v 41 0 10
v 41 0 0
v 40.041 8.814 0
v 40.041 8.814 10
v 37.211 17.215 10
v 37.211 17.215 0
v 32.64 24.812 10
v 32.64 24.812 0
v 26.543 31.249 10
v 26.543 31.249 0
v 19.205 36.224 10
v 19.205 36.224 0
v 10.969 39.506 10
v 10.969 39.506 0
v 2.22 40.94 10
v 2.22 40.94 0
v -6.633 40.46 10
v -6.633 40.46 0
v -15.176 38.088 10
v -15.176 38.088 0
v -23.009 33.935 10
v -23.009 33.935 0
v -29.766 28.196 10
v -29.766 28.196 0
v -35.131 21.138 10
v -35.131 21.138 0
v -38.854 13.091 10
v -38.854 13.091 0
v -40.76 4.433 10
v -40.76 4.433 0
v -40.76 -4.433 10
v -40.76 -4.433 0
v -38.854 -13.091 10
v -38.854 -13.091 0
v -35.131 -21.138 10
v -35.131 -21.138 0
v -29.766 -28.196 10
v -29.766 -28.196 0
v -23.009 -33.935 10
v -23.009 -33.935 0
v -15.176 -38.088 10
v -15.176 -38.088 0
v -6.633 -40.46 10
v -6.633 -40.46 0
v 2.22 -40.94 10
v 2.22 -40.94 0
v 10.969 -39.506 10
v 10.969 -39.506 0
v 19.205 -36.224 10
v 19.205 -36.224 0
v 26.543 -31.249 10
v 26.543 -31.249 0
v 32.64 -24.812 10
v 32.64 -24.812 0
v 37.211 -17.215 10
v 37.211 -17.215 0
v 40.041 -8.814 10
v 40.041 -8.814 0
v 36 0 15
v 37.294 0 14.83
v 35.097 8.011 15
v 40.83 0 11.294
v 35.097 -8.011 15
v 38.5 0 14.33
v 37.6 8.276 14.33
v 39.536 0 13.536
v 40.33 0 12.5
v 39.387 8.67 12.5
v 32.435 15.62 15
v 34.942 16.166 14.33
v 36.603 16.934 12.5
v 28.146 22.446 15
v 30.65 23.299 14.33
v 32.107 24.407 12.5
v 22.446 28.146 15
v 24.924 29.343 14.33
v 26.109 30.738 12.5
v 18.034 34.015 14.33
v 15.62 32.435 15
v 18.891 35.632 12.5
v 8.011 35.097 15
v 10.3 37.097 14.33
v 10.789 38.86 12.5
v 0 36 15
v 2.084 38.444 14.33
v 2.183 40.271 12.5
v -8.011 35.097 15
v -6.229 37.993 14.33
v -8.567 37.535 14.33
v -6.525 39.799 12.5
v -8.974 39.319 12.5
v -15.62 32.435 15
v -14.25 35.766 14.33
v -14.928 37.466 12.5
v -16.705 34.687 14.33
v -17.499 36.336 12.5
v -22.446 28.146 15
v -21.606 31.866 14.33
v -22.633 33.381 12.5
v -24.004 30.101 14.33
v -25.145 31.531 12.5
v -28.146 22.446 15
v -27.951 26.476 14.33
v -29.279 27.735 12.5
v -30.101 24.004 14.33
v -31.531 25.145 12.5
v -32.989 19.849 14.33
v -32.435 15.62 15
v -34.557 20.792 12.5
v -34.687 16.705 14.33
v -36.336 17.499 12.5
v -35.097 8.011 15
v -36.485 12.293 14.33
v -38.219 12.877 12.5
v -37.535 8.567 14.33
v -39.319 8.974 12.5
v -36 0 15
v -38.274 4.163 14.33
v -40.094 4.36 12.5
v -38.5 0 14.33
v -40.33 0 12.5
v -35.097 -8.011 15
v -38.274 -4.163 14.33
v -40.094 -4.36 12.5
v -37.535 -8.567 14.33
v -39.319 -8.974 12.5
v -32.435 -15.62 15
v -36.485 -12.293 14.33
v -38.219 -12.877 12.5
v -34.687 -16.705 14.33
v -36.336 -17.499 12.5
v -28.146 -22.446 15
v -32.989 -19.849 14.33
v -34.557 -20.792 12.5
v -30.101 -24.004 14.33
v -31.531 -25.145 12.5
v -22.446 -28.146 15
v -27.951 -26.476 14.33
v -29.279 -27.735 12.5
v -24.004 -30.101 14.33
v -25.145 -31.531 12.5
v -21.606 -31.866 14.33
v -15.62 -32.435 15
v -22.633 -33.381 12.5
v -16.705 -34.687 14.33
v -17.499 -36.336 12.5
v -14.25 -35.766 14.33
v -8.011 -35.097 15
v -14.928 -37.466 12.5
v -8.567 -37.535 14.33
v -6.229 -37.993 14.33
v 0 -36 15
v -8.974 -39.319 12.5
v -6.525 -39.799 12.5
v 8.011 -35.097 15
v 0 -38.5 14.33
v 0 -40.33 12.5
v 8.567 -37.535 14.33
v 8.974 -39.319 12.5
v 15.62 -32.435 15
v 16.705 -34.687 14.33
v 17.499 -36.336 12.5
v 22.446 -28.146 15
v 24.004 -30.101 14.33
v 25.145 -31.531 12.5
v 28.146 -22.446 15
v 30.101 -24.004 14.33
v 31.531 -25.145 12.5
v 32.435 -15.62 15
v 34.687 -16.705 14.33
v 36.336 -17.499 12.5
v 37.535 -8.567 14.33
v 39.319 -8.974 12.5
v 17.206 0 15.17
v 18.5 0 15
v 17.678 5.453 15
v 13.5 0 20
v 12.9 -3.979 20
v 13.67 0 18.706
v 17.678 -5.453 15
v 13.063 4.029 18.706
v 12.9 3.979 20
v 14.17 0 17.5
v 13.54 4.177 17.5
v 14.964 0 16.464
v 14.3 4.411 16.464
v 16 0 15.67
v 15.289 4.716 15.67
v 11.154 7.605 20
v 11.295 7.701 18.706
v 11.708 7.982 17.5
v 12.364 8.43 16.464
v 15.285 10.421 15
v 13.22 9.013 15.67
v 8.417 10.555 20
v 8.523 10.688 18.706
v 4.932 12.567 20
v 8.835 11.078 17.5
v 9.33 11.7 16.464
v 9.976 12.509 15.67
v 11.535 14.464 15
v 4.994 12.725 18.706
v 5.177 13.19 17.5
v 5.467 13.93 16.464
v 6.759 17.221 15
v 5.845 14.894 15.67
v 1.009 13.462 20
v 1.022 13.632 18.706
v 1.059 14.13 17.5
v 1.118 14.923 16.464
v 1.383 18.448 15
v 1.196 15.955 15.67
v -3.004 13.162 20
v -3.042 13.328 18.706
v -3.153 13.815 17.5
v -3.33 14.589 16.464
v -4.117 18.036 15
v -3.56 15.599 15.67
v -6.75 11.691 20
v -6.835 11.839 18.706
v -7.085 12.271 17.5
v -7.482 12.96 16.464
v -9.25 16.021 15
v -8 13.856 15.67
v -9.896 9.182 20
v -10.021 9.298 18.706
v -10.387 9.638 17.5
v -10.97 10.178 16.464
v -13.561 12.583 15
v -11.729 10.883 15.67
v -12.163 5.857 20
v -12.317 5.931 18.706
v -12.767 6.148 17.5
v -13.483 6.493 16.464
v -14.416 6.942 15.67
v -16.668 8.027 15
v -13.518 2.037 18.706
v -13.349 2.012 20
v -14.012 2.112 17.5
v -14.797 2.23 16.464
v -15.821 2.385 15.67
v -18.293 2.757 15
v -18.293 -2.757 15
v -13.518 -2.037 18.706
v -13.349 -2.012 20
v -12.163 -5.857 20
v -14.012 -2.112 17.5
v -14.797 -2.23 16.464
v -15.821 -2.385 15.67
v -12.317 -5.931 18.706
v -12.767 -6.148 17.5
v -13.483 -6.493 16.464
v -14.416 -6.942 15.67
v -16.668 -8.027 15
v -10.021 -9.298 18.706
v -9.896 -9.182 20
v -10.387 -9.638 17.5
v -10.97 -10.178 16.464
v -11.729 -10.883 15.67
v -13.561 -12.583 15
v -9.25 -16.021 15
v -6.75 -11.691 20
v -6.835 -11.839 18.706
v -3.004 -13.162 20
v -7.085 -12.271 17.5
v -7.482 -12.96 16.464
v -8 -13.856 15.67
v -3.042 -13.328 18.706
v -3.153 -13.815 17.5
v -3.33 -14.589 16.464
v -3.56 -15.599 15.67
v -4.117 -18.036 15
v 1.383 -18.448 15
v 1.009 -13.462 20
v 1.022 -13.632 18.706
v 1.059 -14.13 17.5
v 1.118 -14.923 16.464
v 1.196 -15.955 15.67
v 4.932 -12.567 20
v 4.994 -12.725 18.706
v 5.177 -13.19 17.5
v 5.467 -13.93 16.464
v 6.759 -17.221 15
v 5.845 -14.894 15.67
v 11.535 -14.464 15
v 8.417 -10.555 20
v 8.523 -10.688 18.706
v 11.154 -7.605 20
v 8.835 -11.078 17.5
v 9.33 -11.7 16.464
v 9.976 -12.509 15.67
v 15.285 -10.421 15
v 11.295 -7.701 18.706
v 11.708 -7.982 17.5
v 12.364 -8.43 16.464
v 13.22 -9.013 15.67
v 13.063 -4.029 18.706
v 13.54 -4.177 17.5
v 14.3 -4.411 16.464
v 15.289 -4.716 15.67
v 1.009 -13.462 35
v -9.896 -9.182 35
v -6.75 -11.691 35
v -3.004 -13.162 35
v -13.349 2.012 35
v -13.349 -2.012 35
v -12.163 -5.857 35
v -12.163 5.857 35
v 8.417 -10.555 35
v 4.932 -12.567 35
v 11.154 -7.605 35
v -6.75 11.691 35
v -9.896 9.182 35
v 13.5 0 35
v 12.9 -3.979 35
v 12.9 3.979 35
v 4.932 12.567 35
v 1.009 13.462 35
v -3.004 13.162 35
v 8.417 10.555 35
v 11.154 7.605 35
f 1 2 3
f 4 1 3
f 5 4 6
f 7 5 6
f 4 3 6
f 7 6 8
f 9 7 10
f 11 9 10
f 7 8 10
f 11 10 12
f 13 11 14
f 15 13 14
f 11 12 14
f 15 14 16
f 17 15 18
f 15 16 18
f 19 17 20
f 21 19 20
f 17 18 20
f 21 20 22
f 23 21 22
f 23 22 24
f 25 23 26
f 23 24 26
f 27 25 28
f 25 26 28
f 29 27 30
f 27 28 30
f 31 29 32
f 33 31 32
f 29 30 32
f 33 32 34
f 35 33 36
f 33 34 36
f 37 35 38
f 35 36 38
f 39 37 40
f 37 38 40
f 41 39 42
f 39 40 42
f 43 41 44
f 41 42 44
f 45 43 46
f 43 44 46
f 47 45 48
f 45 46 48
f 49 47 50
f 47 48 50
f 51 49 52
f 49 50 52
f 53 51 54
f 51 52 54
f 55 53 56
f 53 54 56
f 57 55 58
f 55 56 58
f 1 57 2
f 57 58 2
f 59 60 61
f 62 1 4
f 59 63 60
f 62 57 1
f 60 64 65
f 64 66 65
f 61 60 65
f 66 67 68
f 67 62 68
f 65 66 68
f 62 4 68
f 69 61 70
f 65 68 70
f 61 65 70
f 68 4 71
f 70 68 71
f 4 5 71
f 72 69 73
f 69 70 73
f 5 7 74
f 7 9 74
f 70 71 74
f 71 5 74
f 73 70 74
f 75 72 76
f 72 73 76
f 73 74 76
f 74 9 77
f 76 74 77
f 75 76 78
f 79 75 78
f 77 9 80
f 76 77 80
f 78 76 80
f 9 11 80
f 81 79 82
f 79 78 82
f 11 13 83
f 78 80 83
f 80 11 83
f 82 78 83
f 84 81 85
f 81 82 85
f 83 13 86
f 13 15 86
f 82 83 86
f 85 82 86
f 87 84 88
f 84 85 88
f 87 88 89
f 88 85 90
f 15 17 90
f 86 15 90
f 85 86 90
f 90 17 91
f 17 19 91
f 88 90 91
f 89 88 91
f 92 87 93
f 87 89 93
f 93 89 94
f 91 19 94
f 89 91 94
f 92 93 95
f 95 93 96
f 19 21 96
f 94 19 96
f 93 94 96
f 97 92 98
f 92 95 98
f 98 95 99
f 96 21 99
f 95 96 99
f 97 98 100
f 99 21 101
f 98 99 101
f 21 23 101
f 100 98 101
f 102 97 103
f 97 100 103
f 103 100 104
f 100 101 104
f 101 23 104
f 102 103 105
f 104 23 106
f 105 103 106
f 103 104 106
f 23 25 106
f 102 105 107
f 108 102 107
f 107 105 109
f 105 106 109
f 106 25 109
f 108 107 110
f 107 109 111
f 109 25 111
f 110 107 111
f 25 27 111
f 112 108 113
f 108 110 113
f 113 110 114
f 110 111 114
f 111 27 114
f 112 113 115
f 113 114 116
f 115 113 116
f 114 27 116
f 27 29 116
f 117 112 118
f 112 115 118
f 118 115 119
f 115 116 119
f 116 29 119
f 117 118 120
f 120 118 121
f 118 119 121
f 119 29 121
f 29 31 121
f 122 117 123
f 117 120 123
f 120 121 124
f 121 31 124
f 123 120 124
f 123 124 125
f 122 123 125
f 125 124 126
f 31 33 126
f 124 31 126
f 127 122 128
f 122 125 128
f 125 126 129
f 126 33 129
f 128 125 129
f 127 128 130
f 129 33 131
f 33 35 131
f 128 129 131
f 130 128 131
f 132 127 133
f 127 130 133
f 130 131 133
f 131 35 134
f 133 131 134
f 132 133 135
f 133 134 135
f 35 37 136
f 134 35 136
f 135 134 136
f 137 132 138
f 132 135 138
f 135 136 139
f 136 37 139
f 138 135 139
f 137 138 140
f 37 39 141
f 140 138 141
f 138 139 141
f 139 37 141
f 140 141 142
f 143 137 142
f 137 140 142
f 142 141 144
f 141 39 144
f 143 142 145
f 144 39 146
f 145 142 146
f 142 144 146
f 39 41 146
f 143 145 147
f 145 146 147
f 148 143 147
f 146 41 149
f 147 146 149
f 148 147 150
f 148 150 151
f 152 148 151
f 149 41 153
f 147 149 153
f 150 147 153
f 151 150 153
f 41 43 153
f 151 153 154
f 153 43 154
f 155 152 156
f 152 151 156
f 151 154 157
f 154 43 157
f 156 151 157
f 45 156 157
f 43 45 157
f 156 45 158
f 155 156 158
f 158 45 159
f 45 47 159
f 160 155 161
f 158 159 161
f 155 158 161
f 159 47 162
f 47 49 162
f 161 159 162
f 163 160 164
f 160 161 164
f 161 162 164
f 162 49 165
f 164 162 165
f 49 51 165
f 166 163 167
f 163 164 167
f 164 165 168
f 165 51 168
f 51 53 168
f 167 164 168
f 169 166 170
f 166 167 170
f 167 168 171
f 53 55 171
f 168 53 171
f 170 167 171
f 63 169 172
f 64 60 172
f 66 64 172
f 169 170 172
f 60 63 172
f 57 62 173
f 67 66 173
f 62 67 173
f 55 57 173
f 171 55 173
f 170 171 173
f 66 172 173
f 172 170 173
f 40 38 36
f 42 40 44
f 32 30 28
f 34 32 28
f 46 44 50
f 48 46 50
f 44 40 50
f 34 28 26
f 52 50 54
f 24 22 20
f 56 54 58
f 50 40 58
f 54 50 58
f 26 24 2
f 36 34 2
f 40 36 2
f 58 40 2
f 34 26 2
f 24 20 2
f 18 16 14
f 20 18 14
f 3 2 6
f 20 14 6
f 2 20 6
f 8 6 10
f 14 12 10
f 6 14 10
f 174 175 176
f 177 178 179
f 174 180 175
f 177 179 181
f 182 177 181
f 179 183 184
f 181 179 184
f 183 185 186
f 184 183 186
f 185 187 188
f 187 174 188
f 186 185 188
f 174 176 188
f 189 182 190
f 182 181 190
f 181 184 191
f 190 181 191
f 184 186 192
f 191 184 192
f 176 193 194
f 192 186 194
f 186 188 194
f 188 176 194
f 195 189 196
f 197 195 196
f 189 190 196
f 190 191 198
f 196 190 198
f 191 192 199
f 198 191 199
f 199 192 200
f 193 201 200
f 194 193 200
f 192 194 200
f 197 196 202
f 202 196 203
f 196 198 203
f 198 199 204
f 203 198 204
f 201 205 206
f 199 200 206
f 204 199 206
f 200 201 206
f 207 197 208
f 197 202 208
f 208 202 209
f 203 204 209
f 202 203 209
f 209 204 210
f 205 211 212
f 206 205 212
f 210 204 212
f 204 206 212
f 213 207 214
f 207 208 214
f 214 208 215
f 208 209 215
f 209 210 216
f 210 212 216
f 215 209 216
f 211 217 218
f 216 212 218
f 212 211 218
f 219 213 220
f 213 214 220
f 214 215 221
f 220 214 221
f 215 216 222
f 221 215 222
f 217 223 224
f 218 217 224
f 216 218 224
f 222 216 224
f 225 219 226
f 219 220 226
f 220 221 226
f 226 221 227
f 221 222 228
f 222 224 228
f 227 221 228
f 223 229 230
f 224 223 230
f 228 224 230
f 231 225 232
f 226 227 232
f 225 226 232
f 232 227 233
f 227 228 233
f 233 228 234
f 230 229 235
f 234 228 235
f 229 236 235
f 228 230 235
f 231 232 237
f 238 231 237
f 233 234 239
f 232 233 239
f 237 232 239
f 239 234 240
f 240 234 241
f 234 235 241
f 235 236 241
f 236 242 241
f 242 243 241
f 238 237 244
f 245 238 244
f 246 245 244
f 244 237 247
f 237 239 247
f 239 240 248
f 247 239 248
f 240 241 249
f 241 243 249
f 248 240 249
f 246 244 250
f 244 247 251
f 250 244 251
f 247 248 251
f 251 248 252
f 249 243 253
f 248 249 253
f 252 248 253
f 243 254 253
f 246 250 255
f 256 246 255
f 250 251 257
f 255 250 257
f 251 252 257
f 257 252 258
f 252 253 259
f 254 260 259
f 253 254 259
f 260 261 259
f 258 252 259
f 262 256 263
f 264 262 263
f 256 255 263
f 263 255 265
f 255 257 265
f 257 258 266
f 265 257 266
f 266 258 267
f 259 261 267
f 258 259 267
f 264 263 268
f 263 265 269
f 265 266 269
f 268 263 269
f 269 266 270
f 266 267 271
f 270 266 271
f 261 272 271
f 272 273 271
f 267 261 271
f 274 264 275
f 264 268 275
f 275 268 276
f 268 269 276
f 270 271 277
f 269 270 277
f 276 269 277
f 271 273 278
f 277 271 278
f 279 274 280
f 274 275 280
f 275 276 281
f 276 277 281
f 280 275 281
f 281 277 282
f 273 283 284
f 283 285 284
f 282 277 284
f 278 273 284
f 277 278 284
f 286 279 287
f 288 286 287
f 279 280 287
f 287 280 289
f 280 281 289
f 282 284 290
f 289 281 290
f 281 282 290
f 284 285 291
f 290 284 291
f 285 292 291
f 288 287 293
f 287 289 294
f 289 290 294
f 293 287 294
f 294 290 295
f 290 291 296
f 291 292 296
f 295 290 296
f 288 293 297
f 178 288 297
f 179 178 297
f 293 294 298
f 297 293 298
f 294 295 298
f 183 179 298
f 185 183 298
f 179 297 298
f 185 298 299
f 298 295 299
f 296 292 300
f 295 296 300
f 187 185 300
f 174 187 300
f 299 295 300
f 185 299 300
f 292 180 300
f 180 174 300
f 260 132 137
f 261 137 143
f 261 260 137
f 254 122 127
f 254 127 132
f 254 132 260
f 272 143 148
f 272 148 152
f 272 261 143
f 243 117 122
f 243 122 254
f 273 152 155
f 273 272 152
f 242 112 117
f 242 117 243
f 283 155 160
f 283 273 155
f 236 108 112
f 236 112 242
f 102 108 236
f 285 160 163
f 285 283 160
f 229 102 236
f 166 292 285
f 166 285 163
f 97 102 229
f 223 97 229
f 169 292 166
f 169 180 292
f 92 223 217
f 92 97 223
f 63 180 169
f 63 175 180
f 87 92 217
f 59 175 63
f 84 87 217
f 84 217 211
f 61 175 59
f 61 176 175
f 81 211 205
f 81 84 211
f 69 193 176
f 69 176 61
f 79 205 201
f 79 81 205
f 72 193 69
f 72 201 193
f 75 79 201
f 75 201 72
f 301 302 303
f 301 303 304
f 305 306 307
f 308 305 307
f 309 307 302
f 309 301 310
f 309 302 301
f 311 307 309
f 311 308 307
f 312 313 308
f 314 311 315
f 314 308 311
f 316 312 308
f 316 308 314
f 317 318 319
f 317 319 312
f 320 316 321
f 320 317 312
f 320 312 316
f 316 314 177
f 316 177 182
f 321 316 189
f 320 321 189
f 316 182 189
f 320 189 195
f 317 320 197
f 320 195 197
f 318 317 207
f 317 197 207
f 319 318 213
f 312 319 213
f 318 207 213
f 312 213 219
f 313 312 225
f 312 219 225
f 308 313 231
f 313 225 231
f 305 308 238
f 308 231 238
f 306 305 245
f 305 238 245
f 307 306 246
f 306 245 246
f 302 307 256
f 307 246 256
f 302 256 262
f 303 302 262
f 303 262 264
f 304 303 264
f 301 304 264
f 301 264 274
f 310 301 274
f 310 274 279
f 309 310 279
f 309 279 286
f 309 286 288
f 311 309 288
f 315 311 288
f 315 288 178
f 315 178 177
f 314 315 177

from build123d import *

# Parameters (mm, degrees)
F0_R     = 41
F0_R_2   = 13.5
F1_DEPTH = 15
F2_DEPTH = 35
F3_R     = 5


with BuildPart() as f1:
    # F0 (on Top) → F1 (new body)
    with BuildSketch(Plane.XY):
        Circle(F0_R)
        Circle(F0_R_2, mode=Mode.SUBTRACT)
    extrude(amount=F1_DEPTH)

    # F0 (on Top) → F2 (join)
    with BuildSketch(Plane.XY):
        Circle(F0_R_2)
    extrude(amount=F2_DEPTH)

    # F3
    f3_edges = [f1.edges().sort_by_distance(p)[0] for p in [
        (-41, 0, 15),
        (-13.5, 0, 15),
    ]]
    fillet(f3_edges, radius=F3_R)


solid = f1.part
